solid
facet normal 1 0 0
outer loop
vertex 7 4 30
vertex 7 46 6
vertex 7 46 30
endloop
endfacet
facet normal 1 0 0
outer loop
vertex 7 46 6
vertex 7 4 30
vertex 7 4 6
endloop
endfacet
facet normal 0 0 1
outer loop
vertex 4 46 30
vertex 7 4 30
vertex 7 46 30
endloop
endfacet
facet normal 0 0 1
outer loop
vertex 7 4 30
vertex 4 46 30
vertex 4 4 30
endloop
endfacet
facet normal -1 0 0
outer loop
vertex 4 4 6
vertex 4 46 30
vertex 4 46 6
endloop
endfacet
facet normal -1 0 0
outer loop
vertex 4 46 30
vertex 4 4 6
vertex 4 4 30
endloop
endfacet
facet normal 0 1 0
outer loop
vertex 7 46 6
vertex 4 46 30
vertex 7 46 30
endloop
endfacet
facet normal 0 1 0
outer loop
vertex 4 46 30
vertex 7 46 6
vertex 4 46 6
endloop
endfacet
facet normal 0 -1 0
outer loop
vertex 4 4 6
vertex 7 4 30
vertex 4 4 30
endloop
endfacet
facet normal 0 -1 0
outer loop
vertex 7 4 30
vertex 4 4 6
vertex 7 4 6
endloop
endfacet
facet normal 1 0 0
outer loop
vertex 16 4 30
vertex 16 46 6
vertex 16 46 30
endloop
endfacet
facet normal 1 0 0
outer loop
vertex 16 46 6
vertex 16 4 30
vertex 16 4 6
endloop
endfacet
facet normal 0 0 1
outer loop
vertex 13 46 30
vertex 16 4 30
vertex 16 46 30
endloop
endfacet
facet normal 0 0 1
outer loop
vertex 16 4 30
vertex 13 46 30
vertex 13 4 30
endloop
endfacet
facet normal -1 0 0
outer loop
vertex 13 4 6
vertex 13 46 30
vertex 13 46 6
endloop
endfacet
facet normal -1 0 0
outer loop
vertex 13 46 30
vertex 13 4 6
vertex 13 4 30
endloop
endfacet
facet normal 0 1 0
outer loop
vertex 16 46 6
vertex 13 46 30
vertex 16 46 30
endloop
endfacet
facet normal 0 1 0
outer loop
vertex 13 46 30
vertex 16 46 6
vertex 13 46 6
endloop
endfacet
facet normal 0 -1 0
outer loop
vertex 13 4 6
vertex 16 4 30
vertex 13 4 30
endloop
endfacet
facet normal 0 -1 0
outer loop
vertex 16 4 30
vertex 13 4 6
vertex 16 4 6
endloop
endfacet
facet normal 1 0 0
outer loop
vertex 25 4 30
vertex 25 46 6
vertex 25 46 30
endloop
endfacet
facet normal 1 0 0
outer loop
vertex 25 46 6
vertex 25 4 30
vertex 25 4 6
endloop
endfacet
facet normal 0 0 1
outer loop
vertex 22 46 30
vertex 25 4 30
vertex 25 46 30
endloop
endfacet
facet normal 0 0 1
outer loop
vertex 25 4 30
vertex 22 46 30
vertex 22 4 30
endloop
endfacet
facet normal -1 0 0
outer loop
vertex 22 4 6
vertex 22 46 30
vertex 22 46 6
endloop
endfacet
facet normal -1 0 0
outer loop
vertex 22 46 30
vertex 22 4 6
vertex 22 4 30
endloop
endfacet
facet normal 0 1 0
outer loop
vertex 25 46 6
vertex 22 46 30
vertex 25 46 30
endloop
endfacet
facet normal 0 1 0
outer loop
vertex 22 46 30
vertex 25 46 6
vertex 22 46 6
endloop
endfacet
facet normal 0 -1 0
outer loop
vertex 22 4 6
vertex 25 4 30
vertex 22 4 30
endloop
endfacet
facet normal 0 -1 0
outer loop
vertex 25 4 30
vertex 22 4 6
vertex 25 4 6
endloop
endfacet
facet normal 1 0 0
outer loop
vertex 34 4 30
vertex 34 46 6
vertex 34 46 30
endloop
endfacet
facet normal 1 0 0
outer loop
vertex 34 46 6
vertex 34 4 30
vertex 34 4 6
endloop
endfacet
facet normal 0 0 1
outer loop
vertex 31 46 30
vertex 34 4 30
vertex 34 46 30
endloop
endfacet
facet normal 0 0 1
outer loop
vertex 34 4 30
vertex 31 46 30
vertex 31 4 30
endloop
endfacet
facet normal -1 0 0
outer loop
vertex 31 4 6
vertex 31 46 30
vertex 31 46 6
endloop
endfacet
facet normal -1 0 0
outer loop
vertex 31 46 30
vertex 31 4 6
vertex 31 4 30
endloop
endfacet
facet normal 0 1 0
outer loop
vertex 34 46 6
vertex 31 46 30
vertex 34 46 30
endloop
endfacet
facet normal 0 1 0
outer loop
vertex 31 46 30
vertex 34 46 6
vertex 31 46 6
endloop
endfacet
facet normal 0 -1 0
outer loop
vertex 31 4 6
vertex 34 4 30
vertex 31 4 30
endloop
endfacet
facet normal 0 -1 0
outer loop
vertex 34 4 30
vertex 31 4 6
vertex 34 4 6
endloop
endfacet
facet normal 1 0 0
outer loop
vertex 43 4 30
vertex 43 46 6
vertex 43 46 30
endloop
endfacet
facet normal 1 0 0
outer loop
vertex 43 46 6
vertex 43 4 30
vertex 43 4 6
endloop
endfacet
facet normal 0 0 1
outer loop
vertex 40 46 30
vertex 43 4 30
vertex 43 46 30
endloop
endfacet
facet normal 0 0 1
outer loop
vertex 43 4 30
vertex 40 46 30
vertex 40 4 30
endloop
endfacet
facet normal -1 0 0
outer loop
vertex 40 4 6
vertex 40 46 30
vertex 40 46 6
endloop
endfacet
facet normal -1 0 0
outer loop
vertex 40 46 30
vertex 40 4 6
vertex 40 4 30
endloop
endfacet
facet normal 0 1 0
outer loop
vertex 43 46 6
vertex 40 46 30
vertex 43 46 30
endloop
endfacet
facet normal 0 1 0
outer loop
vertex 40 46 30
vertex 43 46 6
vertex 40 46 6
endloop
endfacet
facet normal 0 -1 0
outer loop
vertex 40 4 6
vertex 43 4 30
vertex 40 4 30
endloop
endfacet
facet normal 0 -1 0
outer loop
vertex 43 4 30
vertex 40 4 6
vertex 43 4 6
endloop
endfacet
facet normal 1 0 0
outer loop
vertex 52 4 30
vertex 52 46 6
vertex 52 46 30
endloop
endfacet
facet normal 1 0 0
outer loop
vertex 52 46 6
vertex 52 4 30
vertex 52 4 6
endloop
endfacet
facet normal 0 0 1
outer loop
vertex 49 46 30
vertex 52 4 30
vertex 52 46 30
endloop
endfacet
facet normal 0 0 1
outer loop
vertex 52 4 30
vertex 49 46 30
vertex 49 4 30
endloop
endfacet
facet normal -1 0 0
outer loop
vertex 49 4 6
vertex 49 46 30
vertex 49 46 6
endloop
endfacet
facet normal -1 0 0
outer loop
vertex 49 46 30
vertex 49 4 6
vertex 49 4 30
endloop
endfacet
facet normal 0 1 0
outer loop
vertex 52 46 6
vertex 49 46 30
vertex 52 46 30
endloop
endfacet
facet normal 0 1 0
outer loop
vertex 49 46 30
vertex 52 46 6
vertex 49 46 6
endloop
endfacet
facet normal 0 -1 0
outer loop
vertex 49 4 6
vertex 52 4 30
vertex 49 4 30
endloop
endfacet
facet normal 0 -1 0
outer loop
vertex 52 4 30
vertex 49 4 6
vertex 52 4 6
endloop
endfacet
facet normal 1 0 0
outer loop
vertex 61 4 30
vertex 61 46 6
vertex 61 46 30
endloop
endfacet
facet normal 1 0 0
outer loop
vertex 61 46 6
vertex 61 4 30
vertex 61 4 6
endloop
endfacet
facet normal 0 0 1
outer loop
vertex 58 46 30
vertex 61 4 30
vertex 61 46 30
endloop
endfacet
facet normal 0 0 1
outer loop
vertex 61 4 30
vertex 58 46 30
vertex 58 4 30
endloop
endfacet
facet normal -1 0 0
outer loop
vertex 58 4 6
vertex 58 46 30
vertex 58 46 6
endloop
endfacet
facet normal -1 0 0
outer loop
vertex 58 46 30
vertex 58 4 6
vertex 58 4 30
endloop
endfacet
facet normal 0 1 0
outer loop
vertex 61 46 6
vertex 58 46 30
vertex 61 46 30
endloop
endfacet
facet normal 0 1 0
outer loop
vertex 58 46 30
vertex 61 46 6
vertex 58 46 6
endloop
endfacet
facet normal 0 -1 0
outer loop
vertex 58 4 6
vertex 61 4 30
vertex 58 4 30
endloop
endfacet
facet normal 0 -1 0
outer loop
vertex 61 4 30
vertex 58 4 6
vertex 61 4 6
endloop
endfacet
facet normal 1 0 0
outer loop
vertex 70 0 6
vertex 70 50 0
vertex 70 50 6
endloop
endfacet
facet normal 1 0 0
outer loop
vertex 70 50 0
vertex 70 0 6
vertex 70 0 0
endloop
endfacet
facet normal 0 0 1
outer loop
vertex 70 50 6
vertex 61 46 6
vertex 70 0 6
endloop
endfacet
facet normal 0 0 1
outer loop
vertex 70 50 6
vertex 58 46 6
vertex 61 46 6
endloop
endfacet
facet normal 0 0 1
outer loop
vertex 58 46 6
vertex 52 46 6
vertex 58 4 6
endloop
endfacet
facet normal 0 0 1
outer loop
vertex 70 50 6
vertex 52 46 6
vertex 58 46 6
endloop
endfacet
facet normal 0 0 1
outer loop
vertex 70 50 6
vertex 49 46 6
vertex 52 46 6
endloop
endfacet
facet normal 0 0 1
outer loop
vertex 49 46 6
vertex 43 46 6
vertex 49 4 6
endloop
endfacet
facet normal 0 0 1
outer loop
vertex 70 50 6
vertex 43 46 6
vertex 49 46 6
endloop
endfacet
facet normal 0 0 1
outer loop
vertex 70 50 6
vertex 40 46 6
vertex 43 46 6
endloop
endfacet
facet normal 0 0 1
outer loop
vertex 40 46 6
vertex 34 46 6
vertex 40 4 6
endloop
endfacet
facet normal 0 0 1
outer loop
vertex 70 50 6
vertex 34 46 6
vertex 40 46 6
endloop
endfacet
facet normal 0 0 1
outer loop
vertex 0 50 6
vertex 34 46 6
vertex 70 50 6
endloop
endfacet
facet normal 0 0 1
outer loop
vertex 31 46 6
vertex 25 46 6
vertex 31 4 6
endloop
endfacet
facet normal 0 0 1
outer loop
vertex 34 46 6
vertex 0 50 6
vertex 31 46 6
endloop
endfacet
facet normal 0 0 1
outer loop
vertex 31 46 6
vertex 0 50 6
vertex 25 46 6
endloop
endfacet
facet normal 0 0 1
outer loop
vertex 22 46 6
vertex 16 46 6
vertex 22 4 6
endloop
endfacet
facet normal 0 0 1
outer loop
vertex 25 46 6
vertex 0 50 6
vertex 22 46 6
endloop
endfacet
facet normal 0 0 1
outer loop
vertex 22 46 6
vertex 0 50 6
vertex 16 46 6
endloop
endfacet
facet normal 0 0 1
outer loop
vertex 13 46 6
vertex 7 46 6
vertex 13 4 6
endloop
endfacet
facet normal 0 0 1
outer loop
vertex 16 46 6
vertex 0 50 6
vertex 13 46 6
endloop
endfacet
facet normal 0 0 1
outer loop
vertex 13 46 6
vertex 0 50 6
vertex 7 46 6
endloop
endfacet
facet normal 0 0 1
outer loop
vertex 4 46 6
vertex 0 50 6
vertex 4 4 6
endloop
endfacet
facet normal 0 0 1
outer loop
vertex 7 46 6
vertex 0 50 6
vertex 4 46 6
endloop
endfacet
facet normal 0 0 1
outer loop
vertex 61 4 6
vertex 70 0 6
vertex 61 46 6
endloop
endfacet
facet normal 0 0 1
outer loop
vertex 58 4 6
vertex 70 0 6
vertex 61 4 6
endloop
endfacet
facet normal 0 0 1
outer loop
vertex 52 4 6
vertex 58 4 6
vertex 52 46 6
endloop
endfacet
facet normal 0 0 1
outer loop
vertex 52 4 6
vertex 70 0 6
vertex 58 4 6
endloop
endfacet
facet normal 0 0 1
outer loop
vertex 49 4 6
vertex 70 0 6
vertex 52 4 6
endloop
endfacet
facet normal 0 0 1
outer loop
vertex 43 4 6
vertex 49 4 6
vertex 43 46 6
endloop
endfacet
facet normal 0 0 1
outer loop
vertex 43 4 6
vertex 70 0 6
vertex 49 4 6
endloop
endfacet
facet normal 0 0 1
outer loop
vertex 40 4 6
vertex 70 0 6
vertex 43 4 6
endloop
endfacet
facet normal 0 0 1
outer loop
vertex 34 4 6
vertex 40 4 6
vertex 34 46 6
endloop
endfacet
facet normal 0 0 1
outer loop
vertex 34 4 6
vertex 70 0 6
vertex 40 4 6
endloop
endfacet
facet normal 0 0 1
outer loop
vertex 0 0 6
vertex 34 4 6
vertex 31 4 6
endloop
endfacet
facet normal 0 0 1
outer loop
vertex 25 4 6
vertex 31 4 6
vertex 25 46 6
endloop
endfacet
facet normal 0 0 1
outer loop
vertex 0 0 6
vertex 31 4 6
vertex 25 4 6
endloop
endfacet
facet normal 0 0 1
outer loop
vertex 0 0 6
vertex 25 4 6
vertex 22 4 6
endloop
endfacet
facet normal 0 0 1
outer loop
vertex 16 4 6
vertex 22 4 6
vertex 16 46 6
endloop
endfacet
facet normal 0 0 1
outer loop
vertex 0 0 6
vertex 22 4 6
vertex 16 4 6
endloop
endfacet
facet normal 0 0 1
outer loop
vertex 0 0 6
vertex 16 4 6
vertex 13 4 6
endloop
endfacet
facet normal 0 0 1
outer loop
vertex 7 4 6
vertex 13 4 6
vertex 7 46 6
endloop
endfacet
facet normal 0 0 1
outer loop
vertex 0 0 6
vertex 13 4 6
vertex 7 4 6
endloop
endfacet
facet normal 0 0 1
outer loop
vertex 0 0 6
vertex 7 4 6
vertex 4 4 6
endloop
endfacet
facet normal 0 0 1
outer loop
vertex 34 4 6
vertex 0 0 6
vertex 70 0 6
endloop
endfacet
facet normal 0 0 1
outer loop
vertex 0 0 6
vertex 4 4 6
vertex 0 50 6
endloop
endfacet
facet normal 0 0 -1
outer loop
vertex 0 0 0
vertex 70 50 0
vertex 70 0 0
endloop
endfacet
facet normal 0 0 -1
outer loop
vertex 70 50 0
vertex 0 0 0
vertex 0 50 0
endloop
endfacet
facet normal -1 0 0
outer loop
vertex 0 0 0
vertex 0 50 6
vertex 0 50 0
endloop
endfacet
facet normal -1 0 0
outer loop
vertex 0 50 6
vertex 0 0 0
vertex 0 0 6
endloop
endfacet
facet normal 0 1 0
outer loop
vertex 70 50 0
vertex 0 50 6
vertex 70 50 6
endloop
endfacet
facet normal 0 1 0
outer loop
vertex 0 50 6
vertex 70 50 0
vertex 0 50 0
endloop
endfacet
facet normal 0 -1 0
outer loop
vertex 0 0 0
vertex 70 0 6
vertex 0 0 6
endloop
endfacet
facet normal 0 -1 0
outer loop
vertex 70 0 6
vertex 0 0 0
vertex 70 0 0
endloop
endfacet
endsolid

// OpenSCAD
$fn = 32;

// ----------------------------------------------------------------------
// Heatsink: uniform fin block
// ----------------------------------------------------------------------

// --- parameters (mm) ---
base_l = 70;              // base length, X
base_w = 50;              // base width, Y
base_t = 6;               // base plate thickness
fin_h = 25;               // fin height above the base
fin_t = 3;                // fin thickness
edge = 4;                 // margin from the base ends
pitch = 9;                // fin pitch
fit_tol = 0.05;           // tolerance for press fits, mm
free_tol = 0.2;           // tolerance for clearance fits, mm

n_fins = floor((base_l - 2 * edge - fin_t) / pitch) + 1;  // fin count
total_h = base_t + fin_h - 1;  // overall height

union() {
  cube([base_l, base_w, base_t]);
  for (i = [0 : n_fins - 1])
    translate([edge + i * pitch, edge, base_t - 1])
      cube([fin_t, base_w - 2 * edge, fin_h]);
}
